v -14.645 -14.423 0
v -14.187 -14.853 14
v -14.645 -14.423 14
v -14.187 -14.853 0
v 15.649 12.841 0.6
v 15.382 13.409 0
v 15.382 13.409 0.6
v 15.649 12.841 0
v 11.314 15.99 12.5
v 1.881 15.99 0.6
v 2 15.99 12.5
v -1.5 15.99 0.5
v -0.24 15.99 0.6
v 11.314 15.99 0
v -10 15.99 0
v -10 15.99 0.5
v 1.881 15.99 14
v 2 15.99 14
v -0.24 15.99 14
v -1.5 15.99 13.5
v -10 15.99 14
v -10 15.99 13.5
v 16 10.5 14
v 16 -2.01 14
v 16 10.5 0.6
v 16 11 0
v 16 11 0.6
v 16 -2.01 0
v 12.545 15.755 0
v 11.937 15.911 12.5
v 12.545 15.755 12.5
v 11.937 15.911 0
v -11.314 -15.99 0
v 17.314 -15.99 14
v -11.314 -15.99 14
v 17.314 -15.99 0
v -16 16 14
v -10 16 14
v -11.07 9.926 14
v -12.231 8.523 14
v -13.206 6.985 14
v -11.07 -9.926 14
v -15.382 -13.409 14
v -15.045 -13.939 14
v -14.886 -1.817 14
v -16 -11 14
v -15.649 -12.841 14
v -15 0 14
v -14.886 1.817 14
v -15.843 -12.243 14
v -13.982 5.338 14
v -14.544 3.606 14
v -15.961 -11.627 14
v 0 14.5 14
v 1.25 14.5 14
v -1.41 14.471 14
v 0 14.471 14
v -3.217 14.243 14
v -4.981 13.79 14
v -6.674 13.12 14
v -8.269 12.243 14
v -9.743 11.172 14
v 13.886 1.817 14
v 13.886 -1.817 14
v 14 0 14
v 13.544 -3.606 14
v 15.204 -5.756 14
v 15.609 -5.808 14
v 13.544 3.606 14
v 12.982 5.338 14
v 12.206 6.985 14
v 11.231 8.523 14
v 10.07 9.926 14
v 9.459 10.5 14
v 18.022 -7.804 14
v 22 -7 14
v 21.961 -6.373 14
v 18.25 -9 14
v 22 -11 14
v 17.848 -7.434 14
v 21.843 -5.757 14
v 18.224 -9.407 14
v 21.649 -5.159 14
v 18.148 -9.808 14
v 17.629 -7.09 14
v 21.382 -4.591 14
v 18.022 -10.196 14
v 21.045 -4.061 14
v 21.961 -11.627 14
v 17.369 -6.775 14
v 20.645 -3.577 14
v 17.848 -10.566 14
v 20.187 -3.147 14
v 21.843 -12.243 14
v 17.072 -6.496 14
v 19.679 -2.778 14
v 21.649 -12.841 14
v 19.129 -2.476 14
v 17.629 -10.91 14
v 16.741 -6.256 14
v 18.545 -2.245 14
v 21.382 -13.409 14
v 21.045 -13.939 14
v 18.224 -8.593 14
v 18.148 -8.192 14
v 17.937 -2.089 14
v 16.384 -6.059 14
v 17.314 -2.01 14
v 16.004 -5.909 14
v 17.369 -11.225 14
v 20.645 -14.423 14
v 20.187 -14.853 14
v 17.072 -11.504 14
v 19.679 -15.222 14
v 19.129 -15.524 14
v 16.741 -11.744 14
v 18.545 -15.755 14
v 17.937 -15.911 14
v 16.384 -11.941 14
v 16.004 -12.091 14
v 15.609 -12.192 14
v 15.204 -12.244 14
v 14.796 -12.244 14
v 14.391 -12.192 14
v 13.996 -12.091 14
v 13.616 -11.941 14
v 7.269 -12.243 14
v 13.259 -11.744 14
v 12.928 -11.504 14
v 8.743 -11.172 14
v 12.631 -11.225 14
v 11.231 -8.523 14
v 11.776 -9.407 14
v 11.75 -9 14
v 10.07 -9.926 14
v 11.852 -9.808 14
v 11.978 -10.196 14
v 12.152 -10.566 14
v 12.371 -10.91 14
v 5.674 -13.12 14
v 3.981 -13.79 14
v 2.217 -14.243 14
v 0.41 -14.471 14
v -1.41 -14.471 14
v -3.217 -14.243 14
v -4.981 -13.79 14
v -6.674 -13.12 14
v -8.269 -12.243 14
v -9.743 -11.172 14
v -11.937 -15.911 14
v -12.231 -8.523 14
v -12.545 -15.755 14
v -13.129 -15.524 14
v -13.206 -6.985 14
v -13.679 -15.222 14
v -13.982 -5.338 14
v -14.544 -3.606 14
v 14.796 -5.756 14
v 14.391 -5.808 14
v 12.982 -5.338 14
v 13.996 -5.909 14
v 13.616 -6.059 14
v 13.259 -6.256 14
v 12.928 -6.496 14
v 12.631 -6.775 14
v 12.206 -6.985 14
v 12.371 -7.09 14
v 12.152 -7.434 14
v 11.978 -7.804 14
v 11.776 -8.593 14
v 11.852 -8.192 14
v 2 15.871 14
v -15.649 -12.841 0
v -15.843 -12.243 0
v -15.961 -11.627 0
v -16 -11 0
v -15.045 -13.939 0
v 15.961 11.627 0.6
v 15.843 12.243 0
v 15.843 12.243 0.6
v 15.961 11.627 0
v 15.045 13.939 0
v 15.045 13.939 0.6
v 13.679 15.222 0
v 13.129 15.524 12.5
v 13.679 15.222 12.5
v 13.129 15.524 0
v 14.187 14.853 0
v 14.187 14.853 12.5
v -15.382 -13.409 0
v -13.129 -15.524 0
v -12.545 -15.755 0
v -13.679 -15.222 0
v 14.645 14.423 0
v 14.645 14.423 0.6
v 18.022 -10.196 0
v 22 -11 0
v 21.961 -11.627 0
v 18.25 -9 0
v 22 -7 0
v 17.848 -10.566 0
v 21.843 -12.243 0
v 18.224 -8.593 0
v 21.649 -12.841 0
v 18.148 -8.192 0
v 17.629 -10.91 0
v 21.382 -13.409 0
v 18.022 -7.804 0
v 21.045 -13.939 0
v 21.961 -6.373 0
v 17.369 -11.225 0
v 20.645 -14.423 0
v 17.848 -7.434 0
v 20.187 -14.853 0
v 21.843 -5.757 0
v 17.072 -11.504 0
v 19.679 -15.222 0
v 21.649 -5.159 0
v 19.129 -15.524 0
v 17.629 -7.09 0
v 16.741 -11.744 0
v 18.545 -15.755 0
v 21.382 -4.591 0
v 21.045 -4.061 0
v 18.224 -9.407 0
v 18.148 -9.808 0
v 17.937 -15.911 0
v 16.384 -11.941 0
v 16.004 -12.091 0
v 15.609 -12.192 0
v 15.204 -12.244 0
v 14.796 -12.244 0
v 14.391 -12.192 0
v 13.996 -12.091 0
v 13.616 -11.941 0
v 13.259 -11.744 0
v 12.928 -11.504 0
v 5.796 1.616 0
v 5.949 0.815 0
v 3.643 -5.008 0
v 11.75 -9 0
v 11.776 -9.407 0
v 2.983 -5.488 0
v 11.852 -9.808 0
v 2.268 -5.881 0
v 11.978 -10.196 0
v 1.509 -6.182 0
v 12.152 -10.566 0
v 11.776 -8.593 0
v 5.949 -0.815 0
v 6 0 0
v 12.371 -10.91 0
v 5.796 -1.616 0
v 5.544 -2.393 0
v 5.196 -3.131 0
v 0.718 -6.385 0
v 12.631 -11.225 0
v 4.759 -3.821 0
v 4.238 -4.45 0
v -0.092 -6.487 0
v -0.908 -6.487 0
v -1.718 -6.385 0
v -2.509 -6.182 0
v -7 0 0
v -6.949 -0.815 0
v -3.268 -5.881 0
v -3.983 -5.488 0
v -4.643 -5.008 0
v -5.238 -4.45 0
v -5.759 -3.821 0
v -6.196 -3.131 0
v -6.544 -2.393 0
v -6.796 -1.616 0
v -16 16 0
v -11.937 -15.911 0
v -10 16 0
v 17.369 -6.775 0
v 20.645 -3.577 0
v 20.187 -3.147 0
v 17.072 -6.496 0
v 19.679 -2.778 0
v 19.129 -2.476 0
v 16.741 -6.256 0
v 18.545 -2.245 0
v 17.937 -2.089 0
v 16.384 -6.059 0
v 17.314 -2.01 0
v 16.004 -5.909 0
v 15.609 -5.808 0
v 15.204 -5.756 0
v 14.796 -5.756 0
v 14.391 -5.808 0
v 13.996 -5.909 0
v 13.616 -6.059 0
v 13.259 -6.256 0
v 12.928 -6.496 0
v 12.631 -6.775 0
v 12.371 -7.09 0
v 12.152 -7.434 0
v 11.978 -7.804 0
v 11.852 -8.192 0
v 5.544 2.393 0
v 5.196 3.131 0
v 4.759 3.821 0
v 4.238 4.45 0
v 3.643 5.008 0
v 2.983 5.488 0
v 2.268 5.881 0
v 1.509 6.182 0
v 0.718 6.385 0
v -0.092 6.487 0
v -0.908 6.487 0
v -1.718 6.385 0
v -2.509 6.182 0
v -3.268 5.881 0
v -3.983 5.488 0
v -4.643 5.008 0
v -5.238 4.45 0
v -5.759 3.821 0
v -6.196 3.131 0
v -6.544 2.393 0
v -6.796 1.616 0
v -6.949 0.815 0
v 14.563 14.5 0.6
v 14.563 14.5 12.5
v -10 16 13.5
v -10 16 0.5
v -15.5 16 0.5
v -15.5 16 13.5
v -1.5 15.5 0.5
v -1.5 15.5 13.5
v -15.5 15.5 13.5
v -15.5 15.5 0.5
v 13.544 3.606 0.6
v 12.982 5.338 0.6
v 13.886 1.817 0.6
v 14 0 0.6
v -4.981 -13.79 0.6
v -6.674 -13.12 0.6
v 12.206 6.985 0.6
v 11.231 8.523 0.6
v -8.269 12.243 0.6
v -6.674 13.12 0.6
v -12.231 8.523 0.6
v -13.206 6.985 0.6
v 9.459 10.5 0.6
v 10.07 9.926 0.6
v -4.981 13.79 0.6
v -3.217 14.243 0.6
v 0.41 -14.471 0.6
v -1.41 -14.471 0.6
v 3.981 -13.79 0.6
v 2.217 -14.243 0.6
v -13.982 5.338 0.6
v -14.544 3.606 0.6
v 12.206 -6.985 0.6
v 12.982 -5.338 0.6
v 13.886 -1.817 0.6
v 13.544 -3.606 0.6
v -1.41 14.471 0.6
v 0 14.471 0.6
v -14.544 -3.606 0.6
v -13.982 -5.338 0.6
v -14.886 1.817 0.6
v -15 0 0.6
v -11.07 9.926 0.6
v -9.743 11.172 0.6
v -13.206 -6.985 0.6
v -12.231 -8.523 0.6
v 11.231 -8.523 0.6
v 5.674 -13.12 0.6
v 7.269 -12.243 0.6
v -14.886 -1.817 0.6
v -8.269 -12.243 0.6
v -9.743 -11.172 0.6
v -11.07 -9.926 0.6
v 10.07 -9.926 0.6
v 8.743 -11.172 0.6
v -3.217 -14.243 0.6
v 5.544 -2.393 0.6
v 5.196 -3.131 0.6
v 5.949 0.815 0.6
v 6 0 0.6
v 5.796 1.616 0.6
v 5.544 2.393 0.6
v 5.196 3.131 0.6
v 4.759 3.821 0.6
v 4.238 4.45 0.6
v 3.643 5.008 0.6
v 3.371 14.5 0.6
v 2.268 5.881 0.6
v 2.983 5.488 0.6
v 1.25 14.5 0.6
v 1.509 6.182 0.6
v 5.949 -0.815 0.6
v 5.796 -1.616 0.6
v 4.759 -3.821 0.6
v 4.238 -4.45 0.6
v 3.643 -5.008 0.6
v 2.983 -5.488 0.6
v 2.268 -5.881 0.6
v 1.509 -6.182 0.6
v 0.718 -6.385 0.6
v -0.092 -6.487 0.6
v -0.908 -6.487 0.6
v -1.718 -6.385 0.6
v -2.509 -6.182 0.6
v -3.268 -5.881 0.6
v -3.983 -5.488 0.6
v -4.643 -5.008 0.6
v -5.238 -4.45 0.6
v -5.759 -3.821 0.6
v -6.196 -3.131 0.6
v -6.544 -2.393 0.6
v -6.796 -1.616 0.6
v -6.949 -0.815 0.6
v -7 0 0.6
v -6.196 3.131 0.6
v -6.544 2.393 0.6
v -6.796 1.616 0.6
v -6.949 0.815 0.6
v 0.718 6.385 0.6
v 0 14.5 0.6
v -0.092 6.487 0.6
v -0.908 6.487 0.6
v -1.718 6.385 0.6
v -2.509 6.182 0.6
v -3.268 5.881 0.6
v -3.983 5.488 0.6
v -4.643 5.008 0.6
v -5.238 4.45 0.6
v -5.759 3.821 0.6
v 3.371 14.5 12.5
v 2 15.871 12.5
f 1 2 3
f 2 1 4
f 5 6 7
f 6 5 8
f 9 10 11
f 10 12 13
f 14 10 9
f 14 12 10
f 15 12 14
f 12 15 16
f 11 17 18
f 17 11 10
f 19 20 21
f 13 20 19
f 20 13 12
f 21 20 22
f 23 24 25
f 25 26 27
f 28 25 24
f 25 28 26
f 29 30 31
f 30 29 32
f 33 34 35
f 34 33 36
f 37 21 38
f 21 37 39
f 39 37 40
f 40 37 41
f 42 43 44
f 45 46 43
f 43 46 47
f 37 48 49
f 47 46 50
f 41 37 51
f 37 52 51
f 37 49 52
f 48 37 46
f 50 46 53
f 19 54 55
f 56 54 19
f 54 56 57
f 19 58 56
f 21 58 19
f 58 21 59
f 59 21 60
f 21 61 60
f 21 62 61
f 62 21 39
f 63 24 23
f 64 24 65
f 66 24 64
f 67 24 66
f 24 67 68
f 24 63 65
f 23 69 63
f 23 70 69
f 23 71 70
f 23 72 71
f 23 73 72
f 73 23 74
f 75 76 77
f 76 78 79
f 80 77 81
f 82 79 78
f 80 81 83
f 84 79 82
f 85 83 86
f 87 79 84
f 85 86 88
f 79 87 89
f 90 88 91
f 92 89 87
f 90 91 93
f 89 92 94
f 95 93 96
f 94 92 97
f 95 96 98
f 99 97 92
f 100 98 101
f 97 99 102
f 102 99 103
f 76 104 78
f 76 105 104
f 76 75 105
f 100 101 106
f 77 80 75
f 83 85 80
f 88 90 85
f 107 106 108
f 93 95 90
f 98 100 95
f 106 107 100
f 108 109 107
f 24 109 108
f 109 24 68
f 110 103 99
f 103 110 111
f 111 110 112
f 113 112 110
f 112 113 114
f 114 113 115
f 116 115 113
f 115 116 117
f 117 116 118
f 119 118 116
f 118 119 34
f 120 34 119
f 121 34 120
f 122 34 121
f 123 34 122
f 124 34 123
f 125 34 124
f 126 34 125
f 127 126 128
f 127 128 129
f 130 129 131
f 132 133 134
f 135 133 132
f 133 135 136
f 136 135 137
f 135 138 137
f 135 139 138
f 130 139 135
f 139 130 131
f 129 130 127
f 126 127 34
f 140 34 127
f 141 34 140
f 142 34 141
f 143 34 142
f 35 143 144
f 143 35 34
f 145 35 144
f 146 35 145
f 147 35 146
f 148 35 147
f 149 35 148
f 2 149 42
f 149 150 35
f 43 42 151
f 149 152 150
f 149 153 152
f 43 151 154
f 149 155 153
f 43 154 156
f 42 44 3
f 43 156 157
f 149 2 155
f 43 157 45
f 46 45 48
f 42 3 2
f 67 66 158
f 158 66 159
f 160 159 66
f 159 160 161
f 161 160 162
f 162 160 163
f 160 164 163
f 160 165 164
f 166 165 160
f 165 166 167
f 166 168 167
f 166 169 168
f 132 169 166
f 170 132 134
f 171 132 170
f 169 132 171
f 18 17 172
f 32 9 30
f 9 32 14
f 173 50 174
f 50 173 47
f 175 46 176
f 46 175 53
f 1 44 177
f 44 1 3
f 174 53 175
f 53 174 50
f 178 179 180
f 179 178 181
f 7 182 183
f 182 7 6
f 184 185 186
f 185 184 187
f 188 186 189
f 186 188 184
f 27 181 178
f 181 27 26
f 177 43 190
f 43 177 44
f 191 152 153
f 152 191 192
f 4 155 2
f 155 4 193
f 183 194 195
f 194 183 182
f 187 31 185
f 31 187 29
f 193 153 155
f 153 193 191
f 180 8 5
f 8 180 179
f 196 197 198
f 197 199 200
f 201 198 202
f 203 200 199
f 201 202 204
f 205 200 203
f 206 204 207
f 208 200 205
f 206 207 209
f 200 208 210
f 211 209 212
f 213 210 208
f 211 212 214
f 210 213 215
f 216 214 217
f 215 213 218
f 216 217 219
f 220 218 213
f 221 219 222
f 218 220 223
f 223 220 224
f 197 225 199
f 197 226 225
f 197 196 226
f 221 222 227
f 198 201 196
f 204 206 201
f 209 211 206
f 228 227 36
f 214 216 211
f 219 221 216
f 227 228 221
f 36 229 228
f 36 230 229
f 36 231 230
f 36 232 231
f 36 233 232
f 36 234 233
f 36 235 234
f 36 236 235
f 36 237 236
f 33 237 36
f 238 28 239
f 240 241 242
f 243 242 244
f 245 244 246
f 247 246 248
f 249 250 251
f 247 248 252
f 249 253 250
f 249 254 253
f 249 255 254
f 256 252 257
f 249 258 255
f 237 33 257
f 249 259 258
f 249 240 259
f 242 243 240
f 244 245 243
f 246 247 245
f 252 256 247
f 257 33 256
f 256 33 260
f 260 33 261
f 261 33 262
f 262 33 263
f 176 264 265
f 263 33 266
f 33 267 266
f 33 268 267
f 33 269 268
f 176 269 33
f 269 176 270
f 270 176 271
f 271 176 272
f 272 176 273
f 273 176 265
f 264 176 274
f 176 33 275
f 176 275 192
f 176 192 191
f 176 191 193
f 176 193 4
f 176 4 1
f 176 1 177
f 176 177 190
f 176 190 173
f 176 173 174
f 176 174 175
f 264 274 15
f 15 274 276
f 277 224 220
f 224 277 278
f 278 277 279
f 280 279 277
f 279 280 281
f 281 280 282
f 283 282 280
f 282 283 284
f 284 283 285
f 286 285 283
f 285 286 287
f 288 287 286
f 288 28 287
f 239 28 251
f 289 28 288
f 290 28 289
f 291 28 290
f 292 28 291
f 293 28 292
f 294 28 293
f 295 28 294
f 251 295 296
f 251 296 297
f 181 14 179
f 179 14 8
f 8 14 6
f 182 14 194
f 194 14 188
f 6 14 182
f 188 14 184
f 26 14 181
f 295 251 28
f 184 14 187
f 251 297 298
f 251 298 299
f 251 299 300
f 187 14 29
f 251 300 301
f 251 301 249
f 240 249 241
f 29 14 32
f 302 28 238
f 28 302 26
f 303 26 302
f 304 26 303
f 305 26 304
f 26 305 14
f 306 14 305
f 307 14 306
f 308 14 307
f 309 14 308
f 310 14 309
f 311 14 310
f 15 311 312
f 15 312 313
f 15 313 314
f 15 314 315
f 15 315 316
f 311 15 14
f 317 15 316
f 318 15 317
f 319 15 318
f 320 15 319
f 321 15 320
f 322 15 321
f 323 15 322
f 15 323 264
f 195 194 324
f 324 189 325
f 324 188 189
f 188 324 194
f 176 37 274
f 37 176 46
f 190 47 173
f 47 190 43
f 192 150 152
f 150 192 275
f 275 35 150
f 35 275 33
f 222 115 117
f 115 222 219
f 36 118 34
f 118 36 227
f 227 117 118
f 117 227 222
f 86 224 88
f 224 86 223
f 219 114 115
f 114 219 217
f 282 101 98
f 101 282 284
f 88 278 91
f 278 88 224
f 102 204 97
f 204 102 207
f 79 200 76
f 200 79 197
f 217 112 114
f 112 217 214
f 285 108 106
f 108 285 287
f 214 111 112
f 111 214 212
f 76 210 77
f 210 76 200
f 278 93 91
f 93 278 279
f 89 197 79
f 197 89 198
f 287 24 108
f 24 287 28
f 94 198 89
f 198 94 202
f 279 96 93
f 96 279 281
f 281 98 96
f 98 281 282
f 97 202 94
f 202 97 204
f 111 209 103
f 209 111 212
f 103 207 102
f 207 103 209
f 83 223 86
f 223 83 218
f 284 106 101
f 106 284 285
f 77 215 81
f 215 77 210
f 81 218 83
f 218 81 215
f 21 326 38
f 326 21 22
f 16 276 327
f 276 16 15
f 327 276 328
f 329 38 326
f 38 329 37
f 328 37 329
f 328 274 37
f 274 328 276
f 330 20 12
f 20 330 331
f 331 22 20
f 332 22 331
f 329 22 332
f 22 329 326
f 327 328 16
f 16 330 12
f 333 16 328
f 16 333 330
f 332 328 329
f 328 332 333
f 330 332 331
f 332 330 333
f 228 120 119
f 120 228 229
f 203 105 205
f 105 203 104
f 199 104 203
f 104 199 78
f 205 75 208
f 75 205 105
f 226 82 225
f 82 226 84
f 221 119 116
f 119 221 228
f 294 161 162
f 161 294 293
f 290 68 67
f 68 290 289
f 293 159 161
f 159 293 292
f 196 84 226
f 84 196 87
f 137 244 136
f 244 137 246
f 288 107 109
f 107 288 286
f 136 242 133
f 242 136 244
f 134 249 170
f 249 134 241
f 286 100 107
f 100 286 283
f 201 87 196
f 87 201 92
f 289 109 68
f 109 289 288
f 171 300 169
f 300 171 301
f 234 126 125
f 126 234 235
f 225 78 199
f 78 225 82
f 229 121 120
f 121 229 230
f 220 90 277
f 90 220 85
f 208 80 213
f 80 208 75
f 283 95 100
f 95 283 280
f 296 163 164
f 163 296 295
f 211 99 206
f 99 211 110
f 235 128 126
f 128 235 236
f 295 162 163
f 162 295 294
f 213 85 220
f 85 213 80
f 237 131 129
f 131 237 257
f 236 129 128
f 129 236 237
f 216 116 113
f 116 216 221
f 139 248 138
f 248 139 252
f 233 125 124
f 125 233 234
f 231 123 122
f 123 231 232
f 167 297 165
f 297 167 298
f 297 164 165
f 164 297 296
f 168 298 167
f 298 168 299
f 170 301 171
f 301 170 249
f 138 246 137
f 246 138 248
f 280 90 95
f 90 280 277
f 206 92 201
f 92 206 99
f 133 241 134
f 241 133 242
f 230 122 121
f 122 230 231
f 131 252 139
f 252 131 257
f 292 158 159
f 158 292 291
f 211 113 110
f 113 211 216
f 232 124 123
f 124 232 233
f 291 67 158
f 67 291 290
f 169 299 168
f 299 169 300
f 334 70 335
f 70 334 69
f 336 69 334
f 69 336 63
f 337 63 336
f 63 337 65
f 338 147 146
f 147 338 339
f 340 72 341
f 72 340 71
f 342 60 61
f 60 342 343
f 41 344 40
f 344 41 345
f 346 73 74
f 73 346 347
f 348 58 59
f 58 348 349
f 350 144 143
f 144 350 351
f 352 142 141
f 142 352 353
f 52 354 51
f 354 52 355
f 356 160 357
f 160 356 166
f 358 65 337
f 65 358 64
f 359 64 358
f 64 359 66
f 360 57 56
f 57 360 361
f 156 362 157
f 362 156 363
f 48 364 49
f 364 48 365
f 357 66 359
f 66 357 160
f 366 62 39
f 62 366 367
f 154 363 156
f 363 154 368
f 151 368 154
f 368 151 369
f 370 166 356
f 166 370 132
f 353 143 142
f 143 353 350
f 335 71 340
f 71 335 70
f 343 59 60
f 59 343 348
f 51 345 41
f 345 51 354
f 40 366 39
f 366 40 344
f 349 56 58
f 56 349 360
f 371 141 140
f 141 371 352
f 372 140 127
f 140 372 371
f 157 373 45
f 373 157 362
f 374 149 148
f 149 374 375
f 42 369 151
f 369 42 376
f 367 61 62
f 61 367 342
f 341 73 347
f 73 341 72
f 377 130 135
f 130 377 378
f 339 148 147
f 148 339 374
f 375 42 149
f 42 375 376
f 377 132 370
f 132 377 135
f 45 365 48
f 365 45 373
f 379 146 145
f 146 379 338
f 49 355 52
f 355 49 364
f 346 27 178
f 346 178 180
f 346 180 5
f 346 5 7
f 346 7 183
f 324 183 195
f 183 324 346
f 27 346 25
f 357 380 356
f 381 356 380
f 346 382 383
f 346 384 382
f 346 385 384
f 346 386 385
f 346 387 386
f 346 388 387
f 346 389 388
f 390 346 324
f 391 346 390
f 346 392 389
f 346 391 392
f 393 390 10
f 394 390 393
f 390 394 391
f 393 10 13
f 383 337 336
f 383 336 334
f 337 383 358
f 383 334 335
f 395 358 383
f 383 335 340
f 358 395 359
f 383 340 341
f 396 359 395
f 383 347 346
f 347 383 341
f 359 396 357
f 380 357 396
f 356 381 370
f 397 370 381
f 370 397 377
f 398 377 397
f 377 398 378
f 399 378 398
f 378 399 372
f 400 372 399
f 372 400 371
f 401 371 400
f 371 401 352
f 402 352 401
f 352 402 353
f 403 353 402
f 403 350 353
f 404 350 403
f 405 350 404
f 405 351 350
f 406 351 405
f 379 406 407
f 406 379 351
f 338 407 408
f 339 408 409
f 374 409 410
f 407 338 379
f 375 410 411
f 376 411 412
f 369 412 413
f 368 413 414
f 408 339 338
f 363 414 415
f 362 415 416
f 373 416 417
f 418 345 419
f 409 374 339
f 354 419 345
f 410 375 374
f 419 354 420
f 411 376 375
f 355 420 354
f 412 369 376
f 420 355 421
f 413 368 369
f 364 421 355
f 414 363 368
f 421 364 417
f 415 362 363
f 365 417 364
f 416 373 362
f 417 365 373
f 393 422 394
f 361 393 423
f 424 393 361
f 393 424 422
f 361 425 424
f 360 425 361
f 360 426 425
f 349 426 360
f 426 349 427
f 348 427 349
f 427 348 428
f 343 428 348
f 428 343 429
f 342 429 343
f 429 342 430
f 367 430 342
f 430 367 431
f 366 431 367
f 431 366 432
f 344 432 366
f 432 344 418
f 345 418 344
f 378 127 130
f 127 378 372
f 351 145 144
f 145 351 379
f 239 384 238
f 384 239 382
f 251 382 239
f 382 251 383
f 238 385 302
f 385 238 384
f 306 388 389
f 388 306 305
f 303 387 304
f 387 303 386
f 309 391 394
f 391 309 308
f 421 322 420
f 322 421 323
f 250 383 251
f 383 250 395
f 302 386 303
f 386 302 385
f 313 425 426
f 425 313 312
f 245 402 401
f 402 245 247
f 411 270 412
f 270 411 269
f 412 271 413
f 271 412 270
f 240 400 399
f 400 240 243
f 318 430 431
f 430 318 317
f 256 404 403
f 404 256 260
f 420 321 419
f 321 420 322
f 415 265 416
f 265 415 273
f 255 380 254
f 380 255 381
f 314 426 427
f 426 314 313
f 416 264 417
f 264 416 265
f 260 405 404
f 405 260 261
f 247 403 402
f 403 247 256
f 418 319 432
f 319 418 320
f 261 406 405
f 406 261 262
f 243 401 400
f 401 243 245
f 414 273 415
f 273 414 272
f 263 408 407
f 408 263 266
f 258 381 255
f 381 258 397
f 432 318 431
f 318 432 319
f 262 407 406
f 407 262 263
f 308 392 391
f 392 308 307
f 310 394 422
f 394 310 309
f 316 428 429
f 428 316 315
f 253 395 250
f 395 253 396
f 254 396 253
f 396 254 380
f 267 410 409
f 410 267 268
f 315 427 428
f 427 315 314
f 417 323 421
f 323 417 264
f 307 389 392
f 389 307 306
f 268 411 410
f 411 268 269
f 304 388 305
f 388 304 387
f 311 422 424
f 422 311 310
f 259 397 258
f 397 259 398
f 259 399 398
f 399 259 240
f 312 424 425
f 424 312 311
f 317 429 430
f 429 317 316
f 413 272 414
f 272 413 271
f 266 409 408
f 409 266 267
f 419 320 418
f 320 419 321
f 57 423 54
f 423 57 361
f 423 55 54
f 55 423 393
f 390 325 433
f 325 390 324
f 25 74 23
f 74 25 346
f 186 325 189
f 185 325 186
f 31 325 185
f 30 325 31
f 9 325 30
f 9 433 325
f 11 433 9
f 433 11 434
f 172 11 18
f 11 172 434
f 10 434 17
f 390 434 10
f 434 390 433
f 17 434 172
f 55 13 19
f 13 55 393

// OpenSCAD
$fn = 50;


difference() {
	union() {
		hull() {
			translate(v = [-11.0000000000, 11.0000000000, 0]) {
				cylinder(h = 14, r = 5);
			}
			translate(v = [11.0000000000, 11.0000000000, 0]) {
				cylinder(h = 14, r = 5);
			}
			translate(v = [-11.0000000000, -11.0000000000, 0]) {
				cylinder(h = 14, r = 5);
			}
			translate(v = [11.0000000000, -11.0000000000, 0]) {
				cylinder(h = 14, r = 5);
			}
		}
		translate(v = [7.5000000000, -9.0000000000, 0]) {
			hull() {
				translate(v = [-9.5000000000, 2.0000000000, 0]) {
					cylinder(h = 14, r = 5);
				}
				translate(v = [9.5000000000, 2.0000000000, 0]) {
					cylinder(h = 14, r = 5);
				}
				translate(v = [-9.5000000000, -2.0000000000, 0]) {
					cylinder(h = 14, r = 5);
				}
				translate(v = [9.5000000000, -2.0000000000, 0]) {
					cylinder(h = 14, r = 5);
				}
			}
		}
		translate(v = [-16.0000000000, 10.0000000000, 0]) {
			cube(size = [6, 6, 14]);
		}
	}
	union() {
		translate(v = [-15.5000000000, 15.5000000000, 0.5000000000]) {
			cube(size = [14, 0.5000000000, 13.0000000000]);
		}
		translate(v = [15.0000000000, -9.0000000000, -50.0000000000]) {
			cylinder(h = 100, r = 3.2500000000);
		}
		translate(v = [-0.5000000000, 0.0000000000, 0.6000000000]) {
			cylinder(h = 16.4000000000, r = 14.5000000000);
		}
		translate(v = [-0.5000000000, 0.0000000000, -7.0000000000]) {
			cylinder(h = 14, r = 6.5000000000);
		}
		translate(v = [0.0000000000, 10.5000000000, 0.6000000000]) {
			cube(size = [16.0000000000, 4, 16.4000000000]);
		}
		translate(v = [2.0000000000, 10.5000000000, 12.5000000000]) {
			cube(size = [14.0000000000, 7, 1.5000000000]);
		}
		translate(v = [-3.0000000000, 18.7500000000, 0.6000000000]) {
			rotate(a = [0, 0, -45]) {
				cube(size = [10, 1.5000000000, 16.4000000000]);
			}
		}
		translate(v = [2.2500000000, 11.0000000000, 0.6000000000]) {
			cube(size = [7.5000000000, 2, 13.4000000000]);
		}
	}
}
